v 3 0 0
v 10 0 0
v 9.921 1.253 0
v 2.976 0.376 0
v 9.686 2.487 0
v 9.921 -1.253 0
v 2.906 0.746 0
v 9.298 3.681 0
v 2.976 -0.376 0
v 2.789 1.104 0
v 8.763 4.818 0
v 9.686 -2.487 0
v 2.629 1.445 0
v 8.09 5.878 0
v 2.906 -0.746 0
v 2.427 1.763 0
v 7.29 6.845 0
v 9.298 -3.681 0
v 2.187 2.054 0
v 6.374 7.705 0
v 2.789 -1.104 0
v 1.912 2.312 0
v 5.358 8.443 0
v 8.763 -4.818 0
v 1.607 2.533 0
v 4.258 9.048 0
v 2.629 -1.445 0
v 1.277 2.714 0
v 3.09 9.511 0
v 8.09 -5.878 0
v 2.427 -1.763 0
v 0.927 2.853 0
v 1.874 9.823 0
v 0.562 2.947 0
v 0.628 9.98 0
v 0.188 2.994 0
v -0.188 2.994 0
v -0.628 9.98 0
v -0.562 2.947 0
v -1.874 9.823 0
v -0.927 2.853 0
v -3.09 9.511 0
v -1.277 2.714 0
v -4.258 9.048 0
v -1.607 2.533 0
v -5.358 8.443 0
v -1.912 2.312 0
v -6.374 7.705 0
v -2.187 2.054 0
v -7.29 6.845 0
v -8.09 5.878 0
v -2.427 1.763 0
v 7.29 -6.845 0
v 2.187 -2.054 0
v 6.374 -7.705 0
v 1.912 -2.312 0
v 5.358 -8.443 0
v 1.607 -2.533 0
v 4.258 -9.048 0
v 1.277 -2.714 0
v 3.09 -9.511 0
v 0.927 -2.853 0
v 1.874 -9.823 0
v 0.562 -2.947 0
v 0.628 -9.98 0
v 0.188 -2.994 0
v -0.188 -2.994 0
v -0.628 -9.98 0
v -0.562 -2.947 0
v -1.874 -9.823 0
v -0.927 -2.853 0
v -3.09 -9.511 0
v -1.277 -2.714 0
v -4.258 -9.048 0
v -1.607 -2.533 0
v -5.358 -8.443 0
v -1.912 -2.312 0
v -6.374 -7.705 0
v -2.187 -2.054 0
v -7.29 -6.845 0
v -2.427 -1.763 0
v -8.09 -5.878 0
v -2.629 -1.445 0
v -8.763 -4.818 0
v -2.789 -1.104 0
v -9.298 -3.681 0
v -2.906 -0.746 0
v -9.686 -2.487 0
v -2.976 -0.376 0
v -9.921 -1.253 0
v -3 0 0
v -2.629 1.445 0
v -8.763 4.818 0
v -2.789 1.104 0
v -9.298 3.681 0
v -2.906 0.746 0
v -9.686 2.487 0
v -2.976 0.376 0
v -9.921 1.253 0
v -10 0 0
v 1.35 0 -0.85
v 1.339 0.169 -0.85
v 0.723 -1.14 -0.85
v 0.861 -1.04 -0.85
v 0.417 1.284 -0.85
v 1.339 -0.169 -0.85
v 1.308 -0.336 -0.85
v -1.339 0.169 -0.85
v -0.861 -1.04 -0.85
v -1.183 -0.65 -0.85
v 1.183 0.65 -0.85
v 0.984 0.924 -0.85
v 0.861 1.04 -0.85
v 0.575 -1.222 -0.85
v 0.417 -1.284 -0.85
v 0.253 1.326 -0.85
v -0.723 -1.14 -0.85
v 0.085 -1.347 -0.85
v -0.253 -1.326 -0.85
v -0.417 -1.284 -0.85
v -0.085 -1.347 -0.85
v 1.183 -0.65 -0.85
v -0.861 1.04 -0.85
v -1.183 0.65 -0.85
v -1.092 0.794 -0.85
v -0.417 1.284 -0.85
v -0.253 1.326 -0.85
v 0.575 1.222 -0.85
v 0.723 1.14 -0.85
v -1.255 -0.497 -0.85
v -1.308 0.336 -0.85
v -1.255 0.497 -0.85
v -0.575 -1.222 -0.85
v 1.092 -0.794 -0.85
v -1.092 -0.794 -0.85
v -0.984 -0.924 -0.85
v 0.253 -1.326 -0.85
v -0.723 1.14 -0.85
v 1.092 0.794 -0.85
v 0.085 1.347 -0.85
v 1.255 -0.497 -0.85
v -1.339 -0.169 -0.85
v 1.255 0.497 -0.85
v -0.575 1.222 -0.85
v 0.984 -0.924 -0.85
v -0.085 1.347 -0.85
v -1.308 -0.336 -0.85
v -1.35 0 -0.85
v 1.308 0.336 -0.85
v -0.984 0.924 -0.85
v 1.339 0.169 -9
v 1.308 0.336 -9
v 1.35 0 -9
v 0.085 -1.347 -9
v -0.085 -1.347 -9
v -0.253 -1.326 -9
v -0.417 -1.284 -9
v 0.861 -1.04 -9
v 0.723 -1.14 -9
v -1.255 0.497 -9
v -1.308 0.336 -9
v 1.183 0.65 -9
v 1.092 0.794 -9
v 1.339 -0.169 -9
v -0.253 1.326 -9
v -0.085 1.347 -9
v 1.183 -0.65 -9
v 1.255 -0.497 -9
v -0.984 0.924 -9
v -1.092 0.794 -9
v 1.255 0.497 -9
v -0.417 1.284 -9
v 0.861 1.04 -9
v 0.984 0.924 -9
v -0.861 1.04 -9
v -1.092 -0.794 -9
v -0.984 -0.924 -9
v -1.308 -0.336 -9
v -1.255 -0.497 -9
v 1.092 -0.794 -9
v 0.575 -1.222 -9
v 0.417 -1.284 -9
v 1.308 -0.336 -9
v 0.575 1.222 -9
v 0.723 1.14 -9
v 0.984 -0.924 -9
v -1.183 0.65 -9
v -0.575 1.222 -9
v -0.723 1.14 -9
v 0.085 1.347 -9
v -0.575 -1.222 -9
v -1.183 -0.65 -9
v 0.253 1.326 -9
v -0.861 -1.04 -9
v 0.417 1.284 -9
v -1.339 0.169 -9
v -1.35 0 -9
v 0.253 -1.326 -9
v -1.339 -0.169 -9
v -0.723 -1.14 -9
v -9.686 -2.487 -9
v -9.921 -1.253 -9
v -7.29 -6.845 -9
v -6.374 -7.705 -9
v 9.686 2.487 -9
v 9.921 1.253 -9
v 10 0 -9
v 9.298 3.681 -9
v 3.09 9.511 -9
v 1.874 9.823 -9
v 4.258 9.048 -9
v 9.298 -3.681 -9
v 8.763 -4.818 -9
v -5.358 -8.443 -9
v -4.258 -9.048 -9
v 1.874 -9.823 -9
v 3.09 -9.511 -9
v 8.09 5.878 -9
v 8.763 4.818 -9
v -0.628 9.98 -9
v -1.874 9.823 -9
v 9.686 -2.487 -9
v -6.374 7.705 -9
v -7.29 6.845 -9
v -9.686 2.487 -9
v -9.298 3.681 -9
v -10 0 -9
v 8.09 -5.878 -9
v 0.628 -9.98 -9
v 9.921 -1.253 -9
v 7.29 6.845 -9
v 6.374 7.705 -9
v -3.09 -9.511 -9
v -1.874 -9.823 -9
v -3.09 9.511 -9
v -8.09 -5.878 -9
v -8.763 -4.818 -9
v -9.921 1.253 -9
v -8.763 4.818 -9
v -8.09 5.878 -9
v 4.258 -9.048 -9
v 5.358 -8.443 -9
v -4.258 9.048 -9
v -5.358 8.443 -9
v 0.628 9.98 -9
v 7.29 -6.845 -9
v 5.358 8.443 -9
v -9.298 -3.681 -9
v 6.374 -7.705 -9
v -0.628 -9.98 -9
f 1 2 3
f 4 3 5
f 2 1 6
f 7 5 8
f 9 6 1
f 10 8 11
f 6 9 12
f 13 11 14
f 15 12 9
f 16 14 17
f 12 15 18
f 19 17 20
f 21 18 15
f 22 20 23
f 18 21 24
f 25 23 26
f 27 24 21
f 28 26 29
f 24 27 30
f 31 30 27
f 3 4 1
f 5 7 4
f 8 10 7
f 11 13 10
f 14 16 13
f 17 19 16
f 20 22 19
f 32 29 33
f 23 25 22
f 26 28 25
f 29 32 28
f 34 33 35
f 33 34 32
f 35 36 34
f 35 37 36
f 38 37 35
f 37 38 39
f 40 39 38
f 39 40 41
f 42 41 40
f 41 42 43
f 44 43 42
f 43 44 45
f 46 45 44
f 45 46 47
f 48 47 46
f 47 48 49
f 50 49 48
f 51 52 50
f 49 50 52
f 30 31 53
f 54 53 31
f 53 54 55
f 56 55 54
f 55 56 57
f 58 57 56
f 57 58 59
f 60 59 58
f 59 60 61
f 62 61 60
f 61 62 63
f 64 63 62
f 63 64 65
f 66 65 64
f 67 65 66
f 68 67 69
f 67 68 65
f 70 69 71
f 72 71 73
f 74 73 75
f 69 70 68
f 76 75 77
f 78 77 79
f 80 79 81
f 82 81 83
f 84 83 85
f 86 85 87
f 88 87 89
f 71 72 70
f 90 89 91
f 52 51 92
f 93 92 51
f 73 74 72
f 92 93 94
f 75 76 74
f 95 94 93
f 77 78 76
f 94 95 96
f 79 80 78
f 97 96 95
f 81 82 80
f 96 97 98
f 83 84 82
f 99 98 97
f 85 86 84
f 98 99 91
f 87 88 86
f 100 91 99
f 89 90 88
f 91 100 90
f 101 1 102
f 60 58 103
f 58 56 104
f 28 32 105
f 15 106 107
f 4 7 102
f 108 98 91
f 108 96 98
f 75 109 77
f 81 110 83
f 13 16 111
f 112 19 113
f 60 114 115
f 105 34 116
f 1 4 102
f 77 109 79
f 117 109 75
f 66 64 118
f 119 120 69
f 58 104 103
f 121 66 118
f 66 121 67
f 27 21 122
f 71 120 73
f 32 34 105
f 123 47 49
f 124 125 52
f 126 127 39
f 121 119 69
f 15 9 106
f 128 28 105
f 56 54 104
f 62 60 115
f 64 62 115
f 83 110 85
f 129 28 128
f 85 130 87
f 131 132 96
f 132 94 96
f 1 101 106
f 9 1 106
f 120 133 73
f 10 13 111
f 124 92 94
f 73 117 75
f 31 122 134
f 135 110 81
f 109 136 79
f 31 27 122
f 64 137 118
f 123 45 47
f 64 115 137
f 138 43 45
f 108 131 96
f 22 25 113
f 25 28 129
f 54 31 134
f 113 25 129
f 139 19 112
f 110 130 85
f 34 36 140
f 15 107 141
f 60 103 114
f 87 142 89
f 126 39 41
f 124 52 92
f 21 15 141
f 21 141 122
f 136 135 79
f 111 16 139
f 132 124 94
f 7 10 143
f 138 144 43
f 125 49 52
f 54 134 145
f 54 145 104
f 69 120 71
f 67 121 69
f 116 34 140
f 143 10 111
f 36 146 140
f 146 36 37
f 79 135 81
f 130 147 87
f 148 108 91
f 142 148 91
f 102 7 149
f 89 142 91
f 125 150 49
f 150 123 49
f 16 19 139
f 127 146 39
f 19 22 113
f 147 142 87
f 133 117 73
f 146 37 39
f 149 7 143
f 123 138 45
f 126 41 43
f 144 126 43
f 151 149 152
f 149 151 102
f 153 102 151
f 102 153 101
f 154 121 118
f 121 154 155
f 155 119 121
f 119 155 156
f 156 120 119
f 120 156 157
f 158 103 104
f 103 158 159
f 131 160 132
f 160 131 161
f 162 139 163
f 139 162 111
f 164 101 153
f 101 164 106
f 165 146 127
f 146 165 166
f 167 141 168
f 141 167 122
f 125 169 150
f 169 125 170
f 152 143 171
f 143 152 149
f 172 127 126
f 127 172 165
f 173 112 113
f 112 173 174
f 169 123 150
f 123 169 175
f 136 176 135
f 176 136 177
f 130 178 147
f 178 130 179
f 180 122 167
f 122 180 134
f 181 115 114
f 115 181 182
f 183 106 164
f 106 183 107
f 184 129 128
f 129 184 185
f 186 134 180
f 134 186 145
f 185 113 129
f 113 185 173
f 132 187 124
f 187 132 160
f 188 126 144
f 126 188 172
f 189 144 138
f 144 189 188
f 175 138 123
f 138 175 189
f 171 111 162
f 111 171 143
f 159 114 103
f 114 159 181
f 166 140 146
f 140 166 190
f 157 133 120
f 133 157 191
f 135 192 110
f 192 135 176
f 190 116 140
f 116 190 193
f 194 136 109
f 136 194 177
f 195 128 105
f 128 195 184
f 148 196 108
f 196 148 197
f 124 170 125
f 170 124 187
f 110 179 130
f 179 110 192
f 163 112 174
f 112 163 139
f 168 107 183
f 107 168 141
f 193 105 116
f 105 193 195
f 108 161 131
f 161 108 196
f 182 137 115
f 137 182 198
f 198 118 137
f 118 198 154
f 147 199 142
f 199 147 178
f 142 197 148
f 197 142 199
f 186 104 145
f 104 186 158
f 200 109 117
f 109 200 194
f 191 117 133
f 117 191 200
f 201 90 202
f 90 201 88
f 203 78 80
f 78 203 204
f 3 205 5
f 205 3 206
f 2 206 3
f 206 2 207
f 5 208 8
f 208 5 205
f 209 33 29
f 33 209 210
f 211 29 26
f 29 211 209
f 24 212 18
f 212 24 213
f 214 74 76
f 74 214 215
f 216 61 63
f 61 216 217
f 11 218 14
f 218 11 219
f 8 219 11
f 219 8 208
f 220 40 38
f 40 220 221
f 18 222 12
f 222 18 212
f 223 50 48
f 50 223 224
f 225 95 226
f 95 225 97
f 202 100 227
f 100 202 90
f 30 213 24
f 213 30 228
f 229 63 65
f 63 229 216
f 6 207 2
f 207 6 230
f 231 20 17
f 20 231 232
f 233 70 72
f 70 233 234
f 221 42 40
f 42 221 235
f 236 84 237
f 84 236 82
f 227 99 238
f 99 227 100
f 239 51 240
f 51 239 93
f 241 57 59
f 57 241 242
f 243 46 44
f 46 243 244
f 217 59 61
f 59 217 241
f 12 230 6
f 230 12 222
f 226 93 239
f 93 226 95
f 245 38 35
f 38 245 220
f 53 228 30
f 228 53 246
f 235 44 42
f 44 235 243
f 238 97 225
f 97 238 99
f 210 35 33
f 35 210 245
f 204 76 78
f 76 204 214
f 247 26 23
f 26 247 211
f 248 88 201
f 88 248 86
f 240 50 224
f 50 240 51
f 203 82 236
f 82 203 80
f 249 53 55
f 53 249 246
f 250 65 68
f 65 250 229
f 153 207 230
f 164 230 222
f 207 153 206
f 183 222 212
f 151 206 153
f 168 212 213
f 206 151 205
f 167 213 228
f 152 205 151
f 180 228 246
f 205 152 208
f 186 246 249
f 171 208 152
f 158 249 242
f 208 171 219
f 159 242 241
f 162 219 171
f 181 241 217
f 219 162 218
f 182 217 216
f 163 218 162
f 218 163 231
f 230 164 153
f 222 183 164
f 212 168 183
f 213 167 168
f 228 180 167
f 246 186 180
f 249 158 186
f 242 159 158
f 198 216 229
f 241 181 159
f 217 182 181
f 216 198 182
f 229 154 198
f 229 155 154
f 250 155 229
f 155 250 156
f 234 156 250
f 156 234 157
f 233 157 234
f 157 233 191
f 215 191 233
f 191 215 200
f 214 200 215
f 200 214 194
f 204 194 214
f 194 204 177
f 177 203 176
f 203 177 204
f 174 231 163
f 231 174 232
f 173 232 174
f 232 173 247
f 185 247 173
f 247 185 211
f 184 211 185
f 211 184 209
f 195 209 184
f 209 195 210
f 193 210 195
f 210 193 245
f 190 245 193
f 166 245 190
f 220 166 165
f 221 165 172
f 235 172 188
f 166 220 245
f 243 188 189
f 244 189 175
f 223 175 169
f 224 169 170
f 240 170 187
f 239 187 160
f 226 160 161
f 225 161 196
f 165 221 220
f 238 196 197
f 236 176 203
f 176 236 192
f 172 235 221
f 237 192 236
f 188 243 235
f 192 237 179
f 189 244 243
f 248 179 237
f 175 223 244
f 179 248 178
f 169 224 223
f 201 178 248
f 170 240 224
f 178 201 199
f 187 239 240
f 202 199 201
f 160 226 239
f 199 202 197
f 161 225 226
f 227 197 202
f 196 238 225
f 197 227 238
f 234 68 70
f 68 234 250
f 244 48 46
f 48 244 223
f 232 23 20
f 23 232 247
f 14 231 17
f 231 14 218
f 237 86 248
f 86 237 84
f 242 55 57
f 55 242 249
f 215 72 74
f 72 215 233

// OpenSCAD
$fn = 50;


difference() {
	union() {
		translate(v = [0, 0, -9.0000000000]) {
			cylinder(h = 9, r = 10.0000000000);
		}
	}
	union() {
		translate(v = [0, 0, 0]) {
			rotate(a = [0, 0, 0]) {
				difference() {
					union() {
						translate(v = [0, 0, -12.0000000000]) {
							cylinder(h = 12, r = 1.0000000000);
						}
						translate(v = [0, 0, -0.8500000000]) {
							cylinder(h = 0.8500000000, r1 = 1.3500000000, r2 = 3.0000000000);
						}
						translate(v = [0, 0, -12.0000000000]) {
							cylinder(h = 12, r = 1.3500000000);
						}
						translate(v = [0, 0, -12.0000000000]) {
							cylinder(h = 12, r = 1.0000000000);
						}
					}
					union();
				}
			}
		}
	}
}
